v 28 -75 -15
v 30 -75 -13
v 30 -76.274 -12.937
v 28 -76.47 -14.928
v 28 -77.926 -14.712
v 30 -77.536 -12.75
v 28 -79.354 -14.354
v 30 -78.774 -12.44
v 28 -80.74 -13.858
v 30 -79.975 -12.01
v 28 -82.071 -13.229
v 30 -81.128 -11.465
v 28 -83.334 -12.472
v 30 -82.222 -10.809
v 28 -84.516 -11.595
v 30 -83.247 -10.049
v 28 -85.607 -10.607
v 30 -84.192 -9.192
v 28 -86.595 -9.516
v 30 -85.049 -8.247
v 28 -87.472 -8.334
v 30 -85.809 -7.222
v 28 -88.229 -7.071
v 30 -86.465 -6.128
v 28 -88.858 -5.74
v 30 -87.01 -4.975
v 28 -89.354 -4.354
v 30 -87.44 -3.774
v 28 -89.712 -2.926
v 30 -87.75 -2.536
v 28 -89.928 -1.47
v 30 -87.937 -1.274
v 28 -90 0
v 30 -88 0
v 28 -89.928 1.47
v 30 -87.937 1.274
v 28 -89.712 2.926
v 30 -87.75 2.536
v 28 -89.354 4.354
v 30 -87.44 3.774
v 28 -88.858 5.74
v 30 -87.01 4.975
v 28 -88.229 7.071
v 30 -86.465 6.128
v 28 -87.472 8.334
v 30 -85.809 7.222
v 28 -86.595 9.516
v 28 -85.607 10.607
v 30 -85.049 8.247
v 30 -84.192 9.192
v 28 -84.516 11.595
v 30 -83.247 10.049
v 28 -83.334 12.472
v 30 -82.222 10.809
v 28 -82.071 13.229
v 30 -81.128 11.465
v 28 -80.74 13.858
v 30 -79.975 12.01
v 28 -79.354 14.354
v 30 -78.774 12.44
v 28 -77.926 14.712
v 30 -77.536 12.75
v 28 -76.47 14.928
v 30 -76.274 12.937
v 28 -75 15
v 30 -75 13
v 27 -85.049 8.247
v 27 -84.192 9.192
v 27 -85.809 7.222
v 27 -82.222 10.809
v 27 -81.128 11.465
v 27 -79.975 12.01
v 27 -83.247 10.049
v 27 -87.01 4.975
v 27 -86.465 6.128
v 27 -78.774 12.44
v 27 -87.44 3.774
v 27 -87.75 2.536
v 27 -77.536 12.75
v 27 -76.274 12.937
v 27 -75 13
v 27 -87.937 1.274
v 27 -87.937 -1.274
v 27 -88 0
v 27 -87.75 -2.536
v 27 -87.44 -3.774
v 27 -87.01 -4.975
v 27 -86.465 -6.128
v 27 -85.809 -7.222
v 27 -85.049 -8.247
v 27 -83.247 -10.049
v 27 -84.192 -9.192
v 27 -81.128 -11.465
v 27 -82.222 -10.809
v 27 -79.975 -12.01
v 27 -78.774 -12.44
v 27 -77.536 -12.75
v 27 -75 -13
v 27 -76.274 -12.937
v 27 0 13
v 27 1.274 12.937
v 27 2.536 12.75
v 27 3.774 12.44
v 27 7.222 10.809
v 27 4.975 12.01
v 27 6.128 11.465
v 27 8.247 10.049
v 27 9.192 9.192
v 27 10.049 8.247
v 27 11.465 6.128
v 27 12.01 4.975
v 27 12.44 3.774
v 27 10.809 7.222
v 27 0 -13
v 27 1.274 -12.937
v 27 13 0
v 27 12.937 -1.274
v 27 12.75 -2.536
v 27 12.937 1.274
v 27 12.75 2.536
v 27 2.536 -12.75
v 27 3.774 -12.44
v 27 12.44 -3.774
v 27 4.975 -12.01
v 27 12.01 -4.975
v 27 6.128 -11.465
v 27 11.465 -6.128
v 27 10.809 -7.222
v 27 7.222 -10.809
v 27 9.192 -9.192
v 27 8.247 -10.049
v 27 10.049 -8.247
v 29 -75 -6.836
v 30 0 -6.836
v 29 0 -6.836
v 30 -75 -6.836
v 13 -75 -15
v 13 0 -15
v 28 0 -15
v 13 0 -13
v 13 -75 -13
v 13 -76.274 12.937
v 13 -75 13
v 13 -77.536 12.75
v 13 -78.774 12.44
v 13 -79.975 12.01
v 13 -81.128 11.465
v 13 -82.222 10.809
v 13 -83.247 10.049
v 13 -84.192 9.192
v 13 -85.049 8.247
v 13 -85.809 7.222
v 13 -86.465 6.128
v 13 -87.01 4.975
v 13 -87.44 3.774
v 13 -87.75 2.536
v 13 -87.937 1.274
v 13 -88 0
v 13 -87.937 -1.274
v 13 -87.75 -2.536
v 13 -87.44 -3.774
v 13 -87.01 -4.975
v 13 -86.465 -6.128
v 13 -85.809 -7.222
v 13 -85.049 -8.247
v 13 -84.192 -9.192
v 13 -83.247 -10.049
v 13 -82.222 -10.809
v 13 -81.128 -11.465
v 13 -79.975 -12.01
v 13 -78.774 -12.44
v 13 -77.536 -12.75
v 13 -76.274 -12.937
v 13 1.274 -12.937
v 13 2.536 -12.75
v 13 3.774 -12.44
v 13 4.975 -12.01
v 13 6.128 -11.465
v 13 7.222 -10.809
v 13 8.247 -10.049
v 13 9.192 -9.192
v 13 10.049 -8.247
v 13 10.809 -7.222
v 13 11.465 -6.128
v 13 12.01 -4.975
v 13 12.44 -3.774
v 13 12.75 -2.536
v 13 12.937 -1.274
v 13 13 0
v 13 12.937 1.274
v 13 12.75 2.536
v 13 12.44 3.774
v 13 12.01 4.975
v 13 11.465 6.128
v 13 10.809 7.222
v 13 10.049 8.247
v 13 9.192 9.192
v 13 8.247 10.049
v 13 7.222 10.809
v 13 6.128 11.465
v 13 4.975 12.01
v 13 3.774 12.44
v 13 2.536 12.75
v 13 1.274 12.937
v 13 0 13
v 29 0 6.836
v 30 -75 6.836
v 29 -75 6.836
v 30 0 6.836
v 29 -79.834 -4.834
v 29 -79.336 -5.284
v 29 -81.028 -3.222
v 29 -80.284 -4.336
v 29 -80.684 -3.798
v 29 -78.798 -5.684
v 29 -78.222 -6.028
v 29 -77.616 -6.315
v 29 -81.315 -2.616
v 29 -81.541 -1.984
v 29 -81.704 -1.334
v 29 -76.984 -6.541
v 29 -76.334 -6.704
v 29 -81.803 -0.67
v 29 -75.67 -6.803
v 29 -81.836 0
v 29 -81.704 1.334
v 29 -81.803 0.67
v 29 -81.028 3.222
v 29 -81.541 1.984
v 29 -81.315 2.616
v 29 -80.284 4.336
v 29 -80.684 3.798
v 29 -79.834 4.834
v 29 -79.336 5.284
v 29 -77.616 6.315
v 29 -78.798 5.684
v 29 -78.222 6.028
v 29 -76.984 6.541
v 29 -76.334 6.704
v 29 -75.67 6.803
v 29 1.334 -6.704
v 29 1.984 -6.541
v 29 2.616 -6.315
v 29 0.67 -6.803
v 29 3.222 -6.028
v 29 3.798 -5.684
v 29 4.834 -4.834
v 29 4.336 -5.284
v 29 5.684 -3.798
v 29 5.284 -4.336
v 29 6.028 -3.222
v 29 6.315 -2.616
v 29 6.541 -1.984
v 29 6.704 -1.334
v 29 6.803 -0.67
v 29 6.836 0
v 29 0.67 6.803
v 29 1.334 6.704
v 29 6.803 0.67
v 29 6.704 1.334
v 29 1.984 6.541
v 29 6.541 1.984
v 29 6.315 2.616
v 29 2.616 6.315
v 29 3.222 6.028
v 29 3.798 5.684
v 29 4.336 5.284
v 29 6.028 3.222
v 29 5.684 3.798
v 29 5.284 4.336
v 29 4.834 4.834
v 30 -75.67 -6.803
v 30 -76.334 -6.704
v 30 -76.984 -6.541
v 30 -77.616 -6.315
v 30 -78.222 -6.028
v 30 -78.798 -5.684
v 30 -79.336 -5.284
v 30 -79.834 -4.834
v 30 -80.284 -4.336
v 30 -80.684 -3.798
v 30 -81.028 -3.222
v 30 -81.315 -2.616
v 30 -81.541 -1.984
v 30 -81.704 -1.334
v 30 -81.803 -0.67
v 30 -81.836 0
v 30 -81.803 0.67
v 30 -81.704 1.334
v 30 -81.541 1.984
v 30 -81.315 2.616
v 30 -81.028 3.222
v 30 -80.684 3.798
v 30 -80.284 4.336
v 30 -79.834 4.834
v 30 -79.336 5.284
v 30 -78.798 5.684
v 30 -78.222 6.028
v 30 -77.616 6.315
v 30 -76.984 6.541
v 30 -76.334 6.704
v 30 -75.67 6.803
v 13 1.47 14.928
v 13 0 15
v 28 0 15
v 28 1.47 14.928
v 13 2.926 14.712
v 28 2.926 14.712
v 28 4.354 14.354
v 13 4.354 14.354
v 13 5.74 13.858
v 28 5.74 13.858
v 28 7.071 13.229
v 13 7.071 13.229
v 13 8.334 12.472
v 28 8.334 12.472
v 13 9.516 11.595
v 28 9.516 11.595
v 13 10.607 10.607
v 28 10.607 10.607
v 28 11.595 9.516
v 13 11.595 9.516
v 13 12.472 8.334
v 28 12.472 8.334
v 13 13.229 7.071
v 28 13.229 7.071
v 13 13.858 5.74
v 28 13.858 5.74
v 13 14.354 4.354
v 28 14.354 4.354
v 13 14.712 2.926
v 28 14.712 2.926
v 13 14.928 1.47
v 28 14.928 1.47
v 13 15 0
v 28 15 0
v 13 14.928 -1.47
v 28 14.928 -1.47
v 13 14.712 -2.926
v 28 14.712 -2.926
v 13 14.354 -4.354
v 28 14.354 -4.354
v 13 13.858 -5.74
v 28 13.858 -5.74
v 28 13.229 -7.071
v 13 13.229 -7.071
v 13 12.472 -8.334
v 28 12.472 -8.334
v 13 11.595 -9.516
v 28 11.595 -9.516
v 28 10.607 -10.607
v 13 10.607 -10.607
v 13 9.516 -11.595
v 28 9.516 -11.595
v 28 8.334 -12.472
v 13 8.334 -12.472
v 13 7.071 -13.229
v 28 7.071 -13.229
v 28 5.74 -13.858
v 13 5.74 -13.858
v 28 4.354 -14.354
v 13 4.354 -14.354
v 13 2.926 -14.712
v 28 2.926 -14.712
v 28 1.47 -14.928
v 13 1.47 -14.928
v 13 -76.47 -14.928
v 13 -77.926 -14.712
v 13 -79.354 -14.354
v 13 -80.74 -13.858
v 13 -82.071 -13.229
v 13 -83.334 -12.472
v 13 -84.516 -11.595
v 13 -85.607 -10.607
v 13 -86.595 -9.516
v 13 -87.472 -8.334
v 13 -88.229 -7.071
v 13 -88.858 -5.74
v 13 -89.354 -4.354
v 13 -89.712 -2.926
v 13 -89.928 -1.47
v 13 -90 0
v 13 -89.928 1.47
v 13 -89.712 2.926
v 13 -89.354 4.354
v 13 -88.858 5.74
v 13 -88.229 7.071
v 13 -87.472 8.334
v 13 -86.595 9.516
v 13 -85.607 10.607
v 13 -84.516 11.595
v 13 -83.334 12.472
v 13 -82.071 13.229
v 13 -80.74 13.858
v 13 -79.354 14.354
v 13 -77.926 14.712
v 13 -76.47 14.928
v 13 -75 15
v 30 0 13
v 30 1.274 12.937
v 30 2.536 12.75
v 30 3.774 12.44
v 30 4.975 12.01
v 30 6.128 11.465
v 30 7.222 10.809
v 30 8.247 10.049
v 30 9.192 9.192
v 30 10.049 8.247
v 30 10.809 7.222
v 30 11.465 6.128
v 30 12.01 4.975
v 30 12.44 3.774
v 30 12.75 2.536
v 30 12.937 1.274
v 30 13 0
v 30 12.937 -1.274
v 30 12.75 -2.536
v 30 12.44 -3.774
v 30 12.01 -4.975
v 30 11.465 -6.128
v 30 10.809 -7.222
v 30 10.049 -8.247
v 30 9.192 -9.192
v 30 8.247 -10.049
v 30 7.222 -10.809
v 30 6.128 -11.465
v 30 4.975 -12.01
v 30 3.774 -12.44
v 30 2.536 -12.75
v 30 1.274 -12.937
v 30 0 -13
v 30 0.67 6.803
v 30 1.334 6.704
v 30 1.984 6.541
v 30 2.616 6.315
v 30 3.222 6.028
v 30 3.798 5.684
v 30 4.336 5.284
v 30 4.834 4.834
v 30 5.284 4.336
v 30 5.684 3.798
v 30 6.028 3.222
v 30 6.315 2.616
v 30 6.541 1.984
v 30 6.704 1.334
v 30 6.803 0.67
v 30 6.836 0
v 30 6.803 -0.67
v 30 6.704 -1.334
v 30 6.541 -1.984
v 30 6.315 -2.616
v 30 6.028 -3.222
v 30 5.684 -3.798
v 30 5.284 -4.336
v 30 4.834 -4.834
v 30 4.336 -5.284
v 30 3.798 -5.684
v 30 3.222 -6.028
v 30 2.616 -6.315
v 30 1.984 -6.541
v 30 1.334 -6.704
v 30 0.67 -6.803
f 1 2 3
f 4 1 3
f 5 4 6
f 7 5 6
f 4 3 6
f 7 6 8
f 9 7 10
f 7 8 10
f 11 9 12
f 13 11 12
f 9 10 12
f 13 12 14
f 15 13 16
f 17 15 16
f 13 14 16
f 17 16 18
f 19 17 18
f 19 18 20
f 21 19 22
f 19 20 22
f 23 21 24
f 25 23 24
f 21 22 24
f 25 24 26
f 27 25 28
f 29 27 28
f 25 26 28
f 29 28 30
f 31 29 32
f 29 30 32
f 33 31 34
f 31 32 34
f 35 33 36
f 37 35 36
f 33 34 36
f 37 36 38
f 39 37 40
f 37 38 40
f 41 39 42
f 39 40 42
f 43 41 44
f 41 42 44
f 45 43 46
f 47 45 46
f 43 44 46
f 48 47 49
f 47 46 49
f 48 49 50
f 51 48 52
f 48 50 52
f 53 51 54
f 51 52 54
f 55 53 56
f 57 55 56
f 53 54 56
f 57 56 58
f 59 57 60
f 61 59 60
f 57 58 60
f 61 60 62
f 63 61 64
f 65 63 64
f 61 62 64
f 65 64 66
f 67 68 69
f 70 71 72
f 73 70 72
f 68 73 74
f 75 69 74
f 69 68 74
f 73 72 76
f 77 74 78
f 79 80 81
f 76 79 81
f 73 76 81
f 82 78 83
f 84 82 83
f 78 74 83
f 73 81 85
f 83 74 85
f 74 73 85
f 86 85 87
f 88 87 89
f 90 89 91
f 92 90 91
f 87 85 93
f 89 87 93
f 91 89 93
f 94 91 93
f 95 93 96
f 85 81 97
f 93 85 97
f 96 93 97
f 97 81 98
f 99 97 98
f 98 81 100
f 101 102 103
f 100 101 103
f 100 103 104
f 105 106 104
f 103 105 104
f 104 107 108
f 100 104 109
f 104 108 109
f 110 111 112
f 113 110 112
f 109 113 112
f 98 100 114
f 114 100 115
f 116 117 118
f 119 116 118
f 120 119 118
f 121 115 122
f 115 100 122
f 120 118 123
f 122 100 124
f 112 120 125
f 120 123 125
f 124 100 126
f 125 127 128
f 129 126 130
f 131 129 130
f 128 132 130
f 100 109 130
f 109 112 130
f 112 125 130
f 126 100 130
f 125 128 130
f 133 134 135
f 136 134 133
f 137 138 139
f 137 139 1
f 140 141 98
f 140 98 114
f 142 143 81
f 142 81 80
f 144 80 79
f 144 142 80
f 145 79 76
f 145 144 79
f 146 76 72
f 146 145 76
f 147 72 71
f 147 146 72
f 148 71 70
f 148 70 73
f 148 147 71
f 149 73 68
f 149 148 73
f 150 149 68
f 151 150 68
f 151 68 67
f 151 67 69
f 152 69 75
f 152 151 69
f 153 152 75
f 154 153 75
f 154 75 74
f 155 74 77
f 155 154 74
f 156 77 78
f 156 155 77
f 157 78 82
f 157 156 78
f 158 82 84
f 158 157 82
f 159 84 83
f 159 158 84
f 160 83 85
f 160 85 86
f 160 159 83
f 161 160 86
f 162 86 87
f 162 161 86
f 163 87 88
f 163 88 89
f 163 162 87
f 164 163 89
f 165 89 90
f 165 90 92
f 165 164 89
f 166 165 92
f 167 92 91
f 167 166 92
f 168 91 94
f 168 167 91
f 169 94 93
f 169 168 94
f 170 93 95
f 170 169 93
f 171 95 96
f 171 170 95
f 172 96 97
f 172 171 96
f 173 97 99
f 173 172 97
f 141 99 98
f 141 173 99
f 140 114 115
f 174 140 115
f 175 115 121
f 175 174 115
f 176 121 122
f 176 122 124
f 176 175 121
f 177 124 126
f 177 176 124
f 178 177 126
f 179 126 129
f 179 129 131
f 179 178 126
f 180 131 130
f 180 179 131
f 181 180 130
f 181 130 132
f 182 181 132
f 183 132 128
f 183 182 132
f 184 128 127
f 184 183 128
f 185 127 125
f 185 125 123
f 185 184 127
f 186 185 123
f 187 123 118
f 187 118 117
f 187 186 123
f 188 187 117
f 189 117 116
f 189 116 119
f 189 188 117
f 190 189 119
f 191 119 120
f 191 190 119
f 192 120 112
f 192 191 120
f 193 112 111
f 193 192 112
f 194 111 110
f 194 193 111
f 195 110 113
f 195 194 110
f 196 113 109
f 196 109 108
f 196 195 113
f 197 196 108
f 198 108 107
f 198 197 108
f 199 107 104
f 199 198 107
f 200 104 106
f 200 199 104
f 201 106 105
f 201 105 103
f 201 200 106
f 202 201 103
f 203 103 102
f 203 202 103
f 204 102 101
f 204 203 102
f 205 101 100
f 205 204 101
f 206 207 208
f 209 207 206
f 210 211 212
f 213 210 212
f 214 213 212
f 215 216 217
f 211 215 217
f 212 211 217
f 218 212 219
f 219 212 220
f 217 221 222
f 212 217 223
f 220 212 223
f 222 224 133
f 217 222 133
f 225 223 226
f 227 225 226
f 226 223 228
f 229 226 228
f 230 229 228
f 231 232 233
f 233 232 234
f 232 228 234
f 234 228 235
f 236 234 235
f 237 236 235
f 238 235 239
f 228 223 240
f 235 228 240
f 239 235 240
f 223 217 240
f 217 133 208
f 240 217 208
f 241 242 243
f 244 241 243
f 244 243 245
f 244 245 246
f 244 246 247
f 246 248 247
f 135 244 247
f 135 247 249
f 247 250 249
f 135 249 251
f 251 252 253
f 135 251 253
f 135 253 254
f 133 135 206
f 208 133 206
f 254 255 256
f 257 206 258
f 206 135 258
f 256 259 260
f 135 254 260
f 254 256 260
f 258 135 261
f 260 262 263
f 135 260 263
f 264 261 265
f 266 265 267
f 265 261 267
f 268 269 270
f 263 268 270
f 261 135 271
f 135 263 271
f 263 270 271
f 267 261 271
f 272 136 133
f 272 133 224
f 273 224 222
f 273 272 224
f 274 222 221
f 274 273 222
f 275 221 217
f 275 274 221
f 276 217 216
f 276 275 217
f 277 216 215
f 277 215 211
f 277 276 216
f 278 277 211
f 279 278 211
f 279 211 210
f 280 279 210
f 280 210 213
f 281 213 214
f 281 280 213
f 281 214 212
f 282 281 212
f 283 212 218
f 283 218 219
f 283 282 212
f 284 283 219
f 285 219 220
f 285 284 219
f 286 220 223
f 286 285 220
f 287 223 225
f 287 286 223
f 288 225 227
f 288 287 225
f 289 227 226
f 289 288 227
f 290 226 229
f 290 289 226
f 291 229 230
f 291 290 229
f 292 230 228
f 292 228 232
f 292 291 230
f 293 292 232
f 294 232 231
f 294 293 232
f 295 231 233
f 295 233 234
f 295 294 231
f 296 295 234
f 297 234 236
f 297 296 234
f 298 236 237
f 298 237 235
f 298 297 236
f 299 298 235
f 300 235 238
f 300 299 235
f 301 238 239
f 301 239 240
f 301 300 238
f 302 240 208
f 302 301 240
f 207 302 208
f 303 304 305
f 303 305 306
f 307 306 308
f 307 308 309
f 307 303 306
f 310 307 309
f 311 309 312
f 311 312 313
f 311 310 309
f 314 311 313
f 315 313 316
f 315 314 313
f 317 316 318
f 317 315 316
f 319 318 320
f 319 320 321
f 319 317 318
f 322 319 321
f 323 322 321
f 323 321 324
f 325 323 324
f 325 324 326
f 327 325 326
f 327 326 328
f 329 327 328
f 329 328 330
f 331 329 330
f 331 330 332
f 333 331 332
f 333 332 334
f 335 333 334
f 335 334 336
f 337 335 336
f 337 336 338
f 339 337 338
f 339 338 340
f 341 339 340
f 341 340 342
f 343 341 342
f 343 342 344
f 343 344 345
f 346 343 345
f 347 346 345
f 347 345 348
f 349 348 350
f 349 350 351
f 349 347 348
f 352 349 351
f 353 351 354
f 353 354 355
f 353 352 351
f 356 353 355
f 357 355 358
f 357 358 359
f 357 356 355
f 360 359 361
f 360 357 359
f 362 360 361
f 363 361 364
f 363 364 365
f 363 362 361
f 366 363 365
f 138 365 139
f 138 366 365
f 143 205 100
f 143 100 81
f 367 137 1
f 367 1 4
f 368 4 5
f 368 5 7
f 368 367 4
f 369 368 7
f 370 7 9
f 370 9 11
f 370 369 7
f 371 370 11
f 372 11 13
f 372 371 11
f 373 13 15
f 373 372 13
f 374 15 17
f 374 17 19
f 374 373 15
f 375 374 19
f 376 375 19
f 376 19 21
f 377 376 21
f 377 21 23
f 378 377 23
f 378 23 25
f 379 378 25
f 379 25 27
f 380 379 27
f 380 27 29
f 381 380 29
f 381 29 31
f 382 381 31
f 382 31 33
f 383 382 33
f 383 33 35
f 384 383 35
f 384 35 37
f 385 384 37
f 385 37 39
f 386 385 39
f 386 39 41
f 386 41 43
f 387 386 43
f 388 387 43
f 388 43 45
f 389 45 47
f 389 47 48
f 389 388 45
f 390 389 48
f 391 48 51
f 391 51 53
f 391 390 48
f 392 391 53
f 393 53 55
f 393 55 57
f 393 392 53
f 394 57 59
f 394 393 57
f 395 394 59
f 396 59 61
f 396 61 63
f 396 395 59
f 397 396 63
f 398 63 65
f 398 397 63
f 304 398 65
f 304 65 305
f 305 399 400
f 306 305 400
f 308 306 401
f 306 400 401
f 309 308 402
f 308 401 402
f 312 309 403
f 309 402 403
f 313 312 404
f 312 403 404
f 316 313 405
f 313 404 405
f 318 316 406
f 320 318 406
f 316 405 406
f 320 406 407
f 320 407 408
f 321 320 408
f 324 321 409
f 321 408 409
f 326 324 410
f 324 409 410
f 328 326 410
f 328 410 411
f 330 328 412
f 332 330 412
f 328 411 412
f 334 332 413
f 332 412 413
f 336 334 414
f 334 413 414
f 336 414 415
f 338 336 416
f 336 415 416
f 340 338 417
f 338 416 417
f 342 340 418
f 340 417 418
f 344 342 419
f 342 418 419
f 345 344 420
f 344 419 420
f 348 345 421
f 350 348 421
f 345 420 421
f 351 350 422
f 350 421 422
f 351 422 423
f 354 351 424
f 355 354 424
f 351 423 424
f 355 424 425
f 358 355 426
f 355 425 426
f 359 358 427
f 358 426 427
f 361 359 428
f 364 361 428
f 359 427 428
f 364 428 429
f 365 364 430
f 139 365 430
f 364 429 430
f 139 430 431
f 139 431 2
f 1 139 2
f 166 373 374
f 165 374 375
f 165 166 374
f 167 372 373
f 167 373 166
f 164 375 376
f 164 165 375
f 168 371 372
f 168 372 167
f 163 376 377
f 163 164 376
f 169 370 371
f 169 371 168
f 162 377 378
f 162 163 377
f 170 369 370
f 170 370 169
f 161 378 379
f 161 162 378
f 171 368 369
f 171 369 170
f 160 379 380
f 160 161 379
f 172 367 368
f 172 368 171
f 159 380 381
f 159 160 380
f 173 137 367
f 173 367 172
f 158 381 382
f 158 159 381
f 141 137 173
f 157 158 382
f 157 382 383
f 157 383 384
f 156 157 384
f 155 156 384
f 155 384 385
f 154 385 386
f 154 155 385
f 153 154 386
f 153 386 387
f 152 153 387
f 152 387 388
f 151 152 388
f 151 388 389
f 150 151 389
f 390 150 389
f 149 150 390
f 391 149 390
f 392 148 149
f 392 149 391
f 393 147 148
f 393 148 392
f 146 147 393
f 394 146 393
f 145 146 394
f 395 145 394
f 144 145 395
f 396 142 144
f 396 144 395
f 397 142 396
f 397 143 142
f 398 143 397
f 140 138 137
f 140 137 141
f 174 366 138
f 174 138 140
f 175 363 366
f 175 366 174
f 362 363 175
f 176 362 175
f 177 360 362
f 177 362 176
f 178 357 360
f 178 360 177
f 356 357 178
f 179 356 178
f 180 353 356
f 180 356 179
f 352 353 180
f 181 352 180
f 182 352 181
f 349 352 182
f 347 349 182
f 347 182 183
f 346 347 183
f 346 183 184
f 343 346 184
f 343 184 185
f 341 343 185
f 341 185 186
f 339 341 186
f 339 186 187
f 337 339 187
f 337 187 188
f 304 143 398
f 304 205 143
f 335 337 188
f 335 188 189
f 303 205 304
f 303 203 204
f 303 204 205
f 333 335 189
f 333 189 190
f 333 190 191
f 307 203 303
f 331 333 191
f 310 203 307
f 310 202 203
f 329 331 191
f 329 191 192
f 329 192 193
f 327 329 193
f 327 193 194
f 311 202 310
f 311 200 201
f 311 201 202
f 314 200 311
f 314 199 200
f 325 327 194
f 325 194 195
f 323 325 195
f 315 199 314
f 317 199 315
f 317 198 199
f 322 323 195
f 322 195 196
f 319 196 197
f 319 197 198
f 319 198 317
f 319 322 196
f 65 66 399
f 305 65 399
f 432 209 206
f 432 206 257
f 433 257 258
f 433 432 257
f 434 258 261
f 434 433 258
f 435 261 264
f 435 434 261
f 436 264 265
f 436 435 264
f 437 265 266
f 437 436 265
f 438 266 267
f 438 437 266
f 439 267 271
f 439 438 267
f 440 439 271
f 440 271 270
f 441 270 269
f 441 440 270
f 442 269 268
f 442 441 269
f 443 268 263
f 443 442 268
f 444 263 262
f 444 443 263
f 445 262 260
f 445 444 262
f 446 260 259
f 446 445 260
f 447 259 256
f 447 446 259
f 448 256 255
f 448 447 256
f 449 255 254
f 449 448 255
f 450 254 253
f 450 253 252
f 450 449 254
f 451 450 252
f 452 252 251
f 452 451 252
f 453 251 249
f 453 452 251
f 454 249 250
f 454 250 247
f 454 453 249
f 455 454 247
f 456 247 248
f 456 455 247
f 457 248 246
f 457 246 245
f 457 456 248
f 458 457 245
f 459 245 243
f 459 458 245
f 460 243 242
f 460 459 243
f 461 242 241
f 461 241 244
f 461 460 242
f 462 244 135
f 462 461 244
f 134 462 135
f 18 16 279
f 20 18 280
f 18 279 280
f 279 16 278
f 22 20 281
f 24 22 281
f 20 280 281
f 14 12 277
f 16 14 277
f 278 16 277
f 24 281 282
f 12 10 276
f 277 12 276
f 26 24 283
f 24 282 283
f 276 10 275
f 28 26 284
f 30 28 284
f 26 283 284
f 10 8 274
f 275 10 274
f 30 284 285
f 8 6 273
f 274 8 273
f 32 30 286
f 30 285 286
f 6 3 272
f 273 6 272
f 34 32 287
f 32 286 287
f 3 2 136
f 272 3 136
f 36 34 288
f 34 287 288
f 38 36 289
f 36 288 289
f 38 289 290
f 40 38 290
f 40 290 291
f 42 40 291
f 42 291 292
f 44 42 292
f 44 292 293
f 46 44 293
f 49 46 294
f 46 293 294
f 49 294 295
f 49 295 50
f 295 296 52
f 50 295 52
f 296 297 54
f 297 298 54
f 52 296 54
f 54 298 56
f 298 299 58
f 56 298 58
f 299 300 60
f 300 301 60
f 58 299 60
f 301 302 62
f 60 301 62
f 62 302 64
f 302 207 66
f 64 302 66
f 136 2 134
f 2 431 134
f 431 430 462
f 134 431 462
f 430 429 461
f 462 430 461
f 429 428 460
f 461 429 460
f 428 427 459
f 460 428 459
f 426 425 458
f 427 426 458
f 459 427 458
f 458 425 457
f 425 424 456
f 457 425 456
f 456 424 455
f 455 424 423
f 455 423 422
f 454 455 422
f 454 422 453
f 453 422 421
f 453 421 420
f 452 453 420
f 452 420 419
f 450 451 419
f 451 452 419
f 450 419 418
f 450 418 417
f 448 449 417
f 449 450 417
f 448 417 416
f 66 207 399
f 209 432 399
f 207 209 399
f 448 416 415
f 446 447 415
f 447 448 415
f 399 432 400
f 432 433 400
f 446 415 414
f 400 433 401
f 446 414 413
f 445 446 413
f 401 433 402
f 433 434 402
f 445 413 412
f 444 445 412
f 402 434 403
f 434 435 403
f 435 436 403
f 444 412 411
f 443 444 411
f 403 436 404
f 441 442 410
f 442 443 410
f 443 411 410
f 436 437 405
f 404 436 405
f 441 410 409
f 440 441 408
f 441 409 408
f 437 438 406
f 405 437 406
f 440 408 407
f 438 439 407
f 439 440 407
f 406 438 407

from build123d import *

# Parameters (mm, degrees)
SKETCH_1_R          = 4.9
EXTRUDE_1_DEPTH     = 10
EXTRUDE_2_DEPTH     = 20
SKETCH_3_R          = 5
EXTRUDE_3_DEPTH     = 20
CHAMFER_1_SIZE      = 2
CUT_EXTRUDE_1_DEPTH = 1
SKETCH_5_W          = 112.212059924
SKETCH_5_H          = 221.512042167
CUT_EXTRUDE_2_DEPTH = 23
CUT_EXTRUDE_3_DEPTH = 14


with BuildPart() as part:
    # 草图1 → 凸台-拉伸1 (new body)
    with BuildSketch(Plane(origin=(0, 0, 0), x_dir=(0, 0, -1), z_dir=(1, 0, 0))):
        Circle(SKETCH_1_R)
    extrude(amount=EXTRUDE_1_DEPTH)

    # 草图2 → 凸台-拉伸2 (add)
    with BuildSketch(Plane(origin=(10, 0, 0), x_dir=(0, 0, -1), z_dir=(1, 0, 0))):
        with BuildLine():
            Line((15, 0), (15, -75))
            ThreePointArc((15, -75), (0, -90), (-15, -75))
            Line((-15, -75), (-15, 0))
            ThreePointArc((-15, 0), (0, 15), (15, 0))
        make_face()
    extrude(amount=EXTRUDE_2_DEPTH)

    # 草图3 → 凸台-拉伸3 (add)
    with BuildSketch(Plane.ZY.offset(-10)):
        with Locations(Location((0, -75, 0), (0, 0, 180))):
            Circle(SKETCH_3_R)
    extrude(amount=EXTRUDE_3_DEPTH)

    # 倒角1
    chamfer_1_edges = [part.edges().sort_by_distance(p)[0] for p in [
        (10, -37.5, 15),
        (10, -90, 0),
        (30, -37.5, -15),
        (10, 15, 0),
        (30, -37.5, 15),
        (30, -90, 0),
        (30, 15, 0),
        (10, -37.5, -15),
    ]]
    chamfer(chamfer_1_edges, length=CHAMFER_1_SIZE)

    # 草图4 → 切除-拉伸1 (cut)
    with BuildSketch(Plane(origin=(30, 0, 0), x_dir=(0, 0, -1), z_dir=(1, 0, 0))):
        with BuildLine():
            Line((6.835634275, 0), (6.835634275, -75))
            ThreePointArc((6.835634275, -75), (0, -81.835634275), (-6.835634275, -75))
            Line((-6.835634275, -75), (-6.835634275, 0))
            ThreePointArc((-6.835634275, 0), (0, 6.835634275), (6.835634275, 0))
        make_face()
    extrude(amount=-CUT_EXTRUDE_1_DEPTH, mode=Mode.SUBTRACT)

    # 草图5 → 切除-拉伸2 (cut)
    with BuildSketch(Plane.ZY.offset(10)):
        with Locations((-34.944932156, -94.819395662)):
            Rectangle(SKETCH_5_W, SKETCH_5_H)
    extrude(amount=-CUT_EXTRUDE_2_DEPTH, mode=Mode.SUBTRACT)

    # 草图6 → 切除-拉伸3 (cut)
    with BuildSketch(Plane.ZY.offset(-13)):
        with BuildLine():
            Line((13, 0), (13, -75))
            ThreePointArc((13, -75), (0, -88), (-13, -75))
            Line((-13, -75), (-13, 0))
            ThreePointArc((-13, 0), (0, 13), (13, 0))
        make_face()
    extrude(amount=-CUT_EXTRUDE_3_DEPTH, mode=Mode.SUBTRACT)


solid = part.part
